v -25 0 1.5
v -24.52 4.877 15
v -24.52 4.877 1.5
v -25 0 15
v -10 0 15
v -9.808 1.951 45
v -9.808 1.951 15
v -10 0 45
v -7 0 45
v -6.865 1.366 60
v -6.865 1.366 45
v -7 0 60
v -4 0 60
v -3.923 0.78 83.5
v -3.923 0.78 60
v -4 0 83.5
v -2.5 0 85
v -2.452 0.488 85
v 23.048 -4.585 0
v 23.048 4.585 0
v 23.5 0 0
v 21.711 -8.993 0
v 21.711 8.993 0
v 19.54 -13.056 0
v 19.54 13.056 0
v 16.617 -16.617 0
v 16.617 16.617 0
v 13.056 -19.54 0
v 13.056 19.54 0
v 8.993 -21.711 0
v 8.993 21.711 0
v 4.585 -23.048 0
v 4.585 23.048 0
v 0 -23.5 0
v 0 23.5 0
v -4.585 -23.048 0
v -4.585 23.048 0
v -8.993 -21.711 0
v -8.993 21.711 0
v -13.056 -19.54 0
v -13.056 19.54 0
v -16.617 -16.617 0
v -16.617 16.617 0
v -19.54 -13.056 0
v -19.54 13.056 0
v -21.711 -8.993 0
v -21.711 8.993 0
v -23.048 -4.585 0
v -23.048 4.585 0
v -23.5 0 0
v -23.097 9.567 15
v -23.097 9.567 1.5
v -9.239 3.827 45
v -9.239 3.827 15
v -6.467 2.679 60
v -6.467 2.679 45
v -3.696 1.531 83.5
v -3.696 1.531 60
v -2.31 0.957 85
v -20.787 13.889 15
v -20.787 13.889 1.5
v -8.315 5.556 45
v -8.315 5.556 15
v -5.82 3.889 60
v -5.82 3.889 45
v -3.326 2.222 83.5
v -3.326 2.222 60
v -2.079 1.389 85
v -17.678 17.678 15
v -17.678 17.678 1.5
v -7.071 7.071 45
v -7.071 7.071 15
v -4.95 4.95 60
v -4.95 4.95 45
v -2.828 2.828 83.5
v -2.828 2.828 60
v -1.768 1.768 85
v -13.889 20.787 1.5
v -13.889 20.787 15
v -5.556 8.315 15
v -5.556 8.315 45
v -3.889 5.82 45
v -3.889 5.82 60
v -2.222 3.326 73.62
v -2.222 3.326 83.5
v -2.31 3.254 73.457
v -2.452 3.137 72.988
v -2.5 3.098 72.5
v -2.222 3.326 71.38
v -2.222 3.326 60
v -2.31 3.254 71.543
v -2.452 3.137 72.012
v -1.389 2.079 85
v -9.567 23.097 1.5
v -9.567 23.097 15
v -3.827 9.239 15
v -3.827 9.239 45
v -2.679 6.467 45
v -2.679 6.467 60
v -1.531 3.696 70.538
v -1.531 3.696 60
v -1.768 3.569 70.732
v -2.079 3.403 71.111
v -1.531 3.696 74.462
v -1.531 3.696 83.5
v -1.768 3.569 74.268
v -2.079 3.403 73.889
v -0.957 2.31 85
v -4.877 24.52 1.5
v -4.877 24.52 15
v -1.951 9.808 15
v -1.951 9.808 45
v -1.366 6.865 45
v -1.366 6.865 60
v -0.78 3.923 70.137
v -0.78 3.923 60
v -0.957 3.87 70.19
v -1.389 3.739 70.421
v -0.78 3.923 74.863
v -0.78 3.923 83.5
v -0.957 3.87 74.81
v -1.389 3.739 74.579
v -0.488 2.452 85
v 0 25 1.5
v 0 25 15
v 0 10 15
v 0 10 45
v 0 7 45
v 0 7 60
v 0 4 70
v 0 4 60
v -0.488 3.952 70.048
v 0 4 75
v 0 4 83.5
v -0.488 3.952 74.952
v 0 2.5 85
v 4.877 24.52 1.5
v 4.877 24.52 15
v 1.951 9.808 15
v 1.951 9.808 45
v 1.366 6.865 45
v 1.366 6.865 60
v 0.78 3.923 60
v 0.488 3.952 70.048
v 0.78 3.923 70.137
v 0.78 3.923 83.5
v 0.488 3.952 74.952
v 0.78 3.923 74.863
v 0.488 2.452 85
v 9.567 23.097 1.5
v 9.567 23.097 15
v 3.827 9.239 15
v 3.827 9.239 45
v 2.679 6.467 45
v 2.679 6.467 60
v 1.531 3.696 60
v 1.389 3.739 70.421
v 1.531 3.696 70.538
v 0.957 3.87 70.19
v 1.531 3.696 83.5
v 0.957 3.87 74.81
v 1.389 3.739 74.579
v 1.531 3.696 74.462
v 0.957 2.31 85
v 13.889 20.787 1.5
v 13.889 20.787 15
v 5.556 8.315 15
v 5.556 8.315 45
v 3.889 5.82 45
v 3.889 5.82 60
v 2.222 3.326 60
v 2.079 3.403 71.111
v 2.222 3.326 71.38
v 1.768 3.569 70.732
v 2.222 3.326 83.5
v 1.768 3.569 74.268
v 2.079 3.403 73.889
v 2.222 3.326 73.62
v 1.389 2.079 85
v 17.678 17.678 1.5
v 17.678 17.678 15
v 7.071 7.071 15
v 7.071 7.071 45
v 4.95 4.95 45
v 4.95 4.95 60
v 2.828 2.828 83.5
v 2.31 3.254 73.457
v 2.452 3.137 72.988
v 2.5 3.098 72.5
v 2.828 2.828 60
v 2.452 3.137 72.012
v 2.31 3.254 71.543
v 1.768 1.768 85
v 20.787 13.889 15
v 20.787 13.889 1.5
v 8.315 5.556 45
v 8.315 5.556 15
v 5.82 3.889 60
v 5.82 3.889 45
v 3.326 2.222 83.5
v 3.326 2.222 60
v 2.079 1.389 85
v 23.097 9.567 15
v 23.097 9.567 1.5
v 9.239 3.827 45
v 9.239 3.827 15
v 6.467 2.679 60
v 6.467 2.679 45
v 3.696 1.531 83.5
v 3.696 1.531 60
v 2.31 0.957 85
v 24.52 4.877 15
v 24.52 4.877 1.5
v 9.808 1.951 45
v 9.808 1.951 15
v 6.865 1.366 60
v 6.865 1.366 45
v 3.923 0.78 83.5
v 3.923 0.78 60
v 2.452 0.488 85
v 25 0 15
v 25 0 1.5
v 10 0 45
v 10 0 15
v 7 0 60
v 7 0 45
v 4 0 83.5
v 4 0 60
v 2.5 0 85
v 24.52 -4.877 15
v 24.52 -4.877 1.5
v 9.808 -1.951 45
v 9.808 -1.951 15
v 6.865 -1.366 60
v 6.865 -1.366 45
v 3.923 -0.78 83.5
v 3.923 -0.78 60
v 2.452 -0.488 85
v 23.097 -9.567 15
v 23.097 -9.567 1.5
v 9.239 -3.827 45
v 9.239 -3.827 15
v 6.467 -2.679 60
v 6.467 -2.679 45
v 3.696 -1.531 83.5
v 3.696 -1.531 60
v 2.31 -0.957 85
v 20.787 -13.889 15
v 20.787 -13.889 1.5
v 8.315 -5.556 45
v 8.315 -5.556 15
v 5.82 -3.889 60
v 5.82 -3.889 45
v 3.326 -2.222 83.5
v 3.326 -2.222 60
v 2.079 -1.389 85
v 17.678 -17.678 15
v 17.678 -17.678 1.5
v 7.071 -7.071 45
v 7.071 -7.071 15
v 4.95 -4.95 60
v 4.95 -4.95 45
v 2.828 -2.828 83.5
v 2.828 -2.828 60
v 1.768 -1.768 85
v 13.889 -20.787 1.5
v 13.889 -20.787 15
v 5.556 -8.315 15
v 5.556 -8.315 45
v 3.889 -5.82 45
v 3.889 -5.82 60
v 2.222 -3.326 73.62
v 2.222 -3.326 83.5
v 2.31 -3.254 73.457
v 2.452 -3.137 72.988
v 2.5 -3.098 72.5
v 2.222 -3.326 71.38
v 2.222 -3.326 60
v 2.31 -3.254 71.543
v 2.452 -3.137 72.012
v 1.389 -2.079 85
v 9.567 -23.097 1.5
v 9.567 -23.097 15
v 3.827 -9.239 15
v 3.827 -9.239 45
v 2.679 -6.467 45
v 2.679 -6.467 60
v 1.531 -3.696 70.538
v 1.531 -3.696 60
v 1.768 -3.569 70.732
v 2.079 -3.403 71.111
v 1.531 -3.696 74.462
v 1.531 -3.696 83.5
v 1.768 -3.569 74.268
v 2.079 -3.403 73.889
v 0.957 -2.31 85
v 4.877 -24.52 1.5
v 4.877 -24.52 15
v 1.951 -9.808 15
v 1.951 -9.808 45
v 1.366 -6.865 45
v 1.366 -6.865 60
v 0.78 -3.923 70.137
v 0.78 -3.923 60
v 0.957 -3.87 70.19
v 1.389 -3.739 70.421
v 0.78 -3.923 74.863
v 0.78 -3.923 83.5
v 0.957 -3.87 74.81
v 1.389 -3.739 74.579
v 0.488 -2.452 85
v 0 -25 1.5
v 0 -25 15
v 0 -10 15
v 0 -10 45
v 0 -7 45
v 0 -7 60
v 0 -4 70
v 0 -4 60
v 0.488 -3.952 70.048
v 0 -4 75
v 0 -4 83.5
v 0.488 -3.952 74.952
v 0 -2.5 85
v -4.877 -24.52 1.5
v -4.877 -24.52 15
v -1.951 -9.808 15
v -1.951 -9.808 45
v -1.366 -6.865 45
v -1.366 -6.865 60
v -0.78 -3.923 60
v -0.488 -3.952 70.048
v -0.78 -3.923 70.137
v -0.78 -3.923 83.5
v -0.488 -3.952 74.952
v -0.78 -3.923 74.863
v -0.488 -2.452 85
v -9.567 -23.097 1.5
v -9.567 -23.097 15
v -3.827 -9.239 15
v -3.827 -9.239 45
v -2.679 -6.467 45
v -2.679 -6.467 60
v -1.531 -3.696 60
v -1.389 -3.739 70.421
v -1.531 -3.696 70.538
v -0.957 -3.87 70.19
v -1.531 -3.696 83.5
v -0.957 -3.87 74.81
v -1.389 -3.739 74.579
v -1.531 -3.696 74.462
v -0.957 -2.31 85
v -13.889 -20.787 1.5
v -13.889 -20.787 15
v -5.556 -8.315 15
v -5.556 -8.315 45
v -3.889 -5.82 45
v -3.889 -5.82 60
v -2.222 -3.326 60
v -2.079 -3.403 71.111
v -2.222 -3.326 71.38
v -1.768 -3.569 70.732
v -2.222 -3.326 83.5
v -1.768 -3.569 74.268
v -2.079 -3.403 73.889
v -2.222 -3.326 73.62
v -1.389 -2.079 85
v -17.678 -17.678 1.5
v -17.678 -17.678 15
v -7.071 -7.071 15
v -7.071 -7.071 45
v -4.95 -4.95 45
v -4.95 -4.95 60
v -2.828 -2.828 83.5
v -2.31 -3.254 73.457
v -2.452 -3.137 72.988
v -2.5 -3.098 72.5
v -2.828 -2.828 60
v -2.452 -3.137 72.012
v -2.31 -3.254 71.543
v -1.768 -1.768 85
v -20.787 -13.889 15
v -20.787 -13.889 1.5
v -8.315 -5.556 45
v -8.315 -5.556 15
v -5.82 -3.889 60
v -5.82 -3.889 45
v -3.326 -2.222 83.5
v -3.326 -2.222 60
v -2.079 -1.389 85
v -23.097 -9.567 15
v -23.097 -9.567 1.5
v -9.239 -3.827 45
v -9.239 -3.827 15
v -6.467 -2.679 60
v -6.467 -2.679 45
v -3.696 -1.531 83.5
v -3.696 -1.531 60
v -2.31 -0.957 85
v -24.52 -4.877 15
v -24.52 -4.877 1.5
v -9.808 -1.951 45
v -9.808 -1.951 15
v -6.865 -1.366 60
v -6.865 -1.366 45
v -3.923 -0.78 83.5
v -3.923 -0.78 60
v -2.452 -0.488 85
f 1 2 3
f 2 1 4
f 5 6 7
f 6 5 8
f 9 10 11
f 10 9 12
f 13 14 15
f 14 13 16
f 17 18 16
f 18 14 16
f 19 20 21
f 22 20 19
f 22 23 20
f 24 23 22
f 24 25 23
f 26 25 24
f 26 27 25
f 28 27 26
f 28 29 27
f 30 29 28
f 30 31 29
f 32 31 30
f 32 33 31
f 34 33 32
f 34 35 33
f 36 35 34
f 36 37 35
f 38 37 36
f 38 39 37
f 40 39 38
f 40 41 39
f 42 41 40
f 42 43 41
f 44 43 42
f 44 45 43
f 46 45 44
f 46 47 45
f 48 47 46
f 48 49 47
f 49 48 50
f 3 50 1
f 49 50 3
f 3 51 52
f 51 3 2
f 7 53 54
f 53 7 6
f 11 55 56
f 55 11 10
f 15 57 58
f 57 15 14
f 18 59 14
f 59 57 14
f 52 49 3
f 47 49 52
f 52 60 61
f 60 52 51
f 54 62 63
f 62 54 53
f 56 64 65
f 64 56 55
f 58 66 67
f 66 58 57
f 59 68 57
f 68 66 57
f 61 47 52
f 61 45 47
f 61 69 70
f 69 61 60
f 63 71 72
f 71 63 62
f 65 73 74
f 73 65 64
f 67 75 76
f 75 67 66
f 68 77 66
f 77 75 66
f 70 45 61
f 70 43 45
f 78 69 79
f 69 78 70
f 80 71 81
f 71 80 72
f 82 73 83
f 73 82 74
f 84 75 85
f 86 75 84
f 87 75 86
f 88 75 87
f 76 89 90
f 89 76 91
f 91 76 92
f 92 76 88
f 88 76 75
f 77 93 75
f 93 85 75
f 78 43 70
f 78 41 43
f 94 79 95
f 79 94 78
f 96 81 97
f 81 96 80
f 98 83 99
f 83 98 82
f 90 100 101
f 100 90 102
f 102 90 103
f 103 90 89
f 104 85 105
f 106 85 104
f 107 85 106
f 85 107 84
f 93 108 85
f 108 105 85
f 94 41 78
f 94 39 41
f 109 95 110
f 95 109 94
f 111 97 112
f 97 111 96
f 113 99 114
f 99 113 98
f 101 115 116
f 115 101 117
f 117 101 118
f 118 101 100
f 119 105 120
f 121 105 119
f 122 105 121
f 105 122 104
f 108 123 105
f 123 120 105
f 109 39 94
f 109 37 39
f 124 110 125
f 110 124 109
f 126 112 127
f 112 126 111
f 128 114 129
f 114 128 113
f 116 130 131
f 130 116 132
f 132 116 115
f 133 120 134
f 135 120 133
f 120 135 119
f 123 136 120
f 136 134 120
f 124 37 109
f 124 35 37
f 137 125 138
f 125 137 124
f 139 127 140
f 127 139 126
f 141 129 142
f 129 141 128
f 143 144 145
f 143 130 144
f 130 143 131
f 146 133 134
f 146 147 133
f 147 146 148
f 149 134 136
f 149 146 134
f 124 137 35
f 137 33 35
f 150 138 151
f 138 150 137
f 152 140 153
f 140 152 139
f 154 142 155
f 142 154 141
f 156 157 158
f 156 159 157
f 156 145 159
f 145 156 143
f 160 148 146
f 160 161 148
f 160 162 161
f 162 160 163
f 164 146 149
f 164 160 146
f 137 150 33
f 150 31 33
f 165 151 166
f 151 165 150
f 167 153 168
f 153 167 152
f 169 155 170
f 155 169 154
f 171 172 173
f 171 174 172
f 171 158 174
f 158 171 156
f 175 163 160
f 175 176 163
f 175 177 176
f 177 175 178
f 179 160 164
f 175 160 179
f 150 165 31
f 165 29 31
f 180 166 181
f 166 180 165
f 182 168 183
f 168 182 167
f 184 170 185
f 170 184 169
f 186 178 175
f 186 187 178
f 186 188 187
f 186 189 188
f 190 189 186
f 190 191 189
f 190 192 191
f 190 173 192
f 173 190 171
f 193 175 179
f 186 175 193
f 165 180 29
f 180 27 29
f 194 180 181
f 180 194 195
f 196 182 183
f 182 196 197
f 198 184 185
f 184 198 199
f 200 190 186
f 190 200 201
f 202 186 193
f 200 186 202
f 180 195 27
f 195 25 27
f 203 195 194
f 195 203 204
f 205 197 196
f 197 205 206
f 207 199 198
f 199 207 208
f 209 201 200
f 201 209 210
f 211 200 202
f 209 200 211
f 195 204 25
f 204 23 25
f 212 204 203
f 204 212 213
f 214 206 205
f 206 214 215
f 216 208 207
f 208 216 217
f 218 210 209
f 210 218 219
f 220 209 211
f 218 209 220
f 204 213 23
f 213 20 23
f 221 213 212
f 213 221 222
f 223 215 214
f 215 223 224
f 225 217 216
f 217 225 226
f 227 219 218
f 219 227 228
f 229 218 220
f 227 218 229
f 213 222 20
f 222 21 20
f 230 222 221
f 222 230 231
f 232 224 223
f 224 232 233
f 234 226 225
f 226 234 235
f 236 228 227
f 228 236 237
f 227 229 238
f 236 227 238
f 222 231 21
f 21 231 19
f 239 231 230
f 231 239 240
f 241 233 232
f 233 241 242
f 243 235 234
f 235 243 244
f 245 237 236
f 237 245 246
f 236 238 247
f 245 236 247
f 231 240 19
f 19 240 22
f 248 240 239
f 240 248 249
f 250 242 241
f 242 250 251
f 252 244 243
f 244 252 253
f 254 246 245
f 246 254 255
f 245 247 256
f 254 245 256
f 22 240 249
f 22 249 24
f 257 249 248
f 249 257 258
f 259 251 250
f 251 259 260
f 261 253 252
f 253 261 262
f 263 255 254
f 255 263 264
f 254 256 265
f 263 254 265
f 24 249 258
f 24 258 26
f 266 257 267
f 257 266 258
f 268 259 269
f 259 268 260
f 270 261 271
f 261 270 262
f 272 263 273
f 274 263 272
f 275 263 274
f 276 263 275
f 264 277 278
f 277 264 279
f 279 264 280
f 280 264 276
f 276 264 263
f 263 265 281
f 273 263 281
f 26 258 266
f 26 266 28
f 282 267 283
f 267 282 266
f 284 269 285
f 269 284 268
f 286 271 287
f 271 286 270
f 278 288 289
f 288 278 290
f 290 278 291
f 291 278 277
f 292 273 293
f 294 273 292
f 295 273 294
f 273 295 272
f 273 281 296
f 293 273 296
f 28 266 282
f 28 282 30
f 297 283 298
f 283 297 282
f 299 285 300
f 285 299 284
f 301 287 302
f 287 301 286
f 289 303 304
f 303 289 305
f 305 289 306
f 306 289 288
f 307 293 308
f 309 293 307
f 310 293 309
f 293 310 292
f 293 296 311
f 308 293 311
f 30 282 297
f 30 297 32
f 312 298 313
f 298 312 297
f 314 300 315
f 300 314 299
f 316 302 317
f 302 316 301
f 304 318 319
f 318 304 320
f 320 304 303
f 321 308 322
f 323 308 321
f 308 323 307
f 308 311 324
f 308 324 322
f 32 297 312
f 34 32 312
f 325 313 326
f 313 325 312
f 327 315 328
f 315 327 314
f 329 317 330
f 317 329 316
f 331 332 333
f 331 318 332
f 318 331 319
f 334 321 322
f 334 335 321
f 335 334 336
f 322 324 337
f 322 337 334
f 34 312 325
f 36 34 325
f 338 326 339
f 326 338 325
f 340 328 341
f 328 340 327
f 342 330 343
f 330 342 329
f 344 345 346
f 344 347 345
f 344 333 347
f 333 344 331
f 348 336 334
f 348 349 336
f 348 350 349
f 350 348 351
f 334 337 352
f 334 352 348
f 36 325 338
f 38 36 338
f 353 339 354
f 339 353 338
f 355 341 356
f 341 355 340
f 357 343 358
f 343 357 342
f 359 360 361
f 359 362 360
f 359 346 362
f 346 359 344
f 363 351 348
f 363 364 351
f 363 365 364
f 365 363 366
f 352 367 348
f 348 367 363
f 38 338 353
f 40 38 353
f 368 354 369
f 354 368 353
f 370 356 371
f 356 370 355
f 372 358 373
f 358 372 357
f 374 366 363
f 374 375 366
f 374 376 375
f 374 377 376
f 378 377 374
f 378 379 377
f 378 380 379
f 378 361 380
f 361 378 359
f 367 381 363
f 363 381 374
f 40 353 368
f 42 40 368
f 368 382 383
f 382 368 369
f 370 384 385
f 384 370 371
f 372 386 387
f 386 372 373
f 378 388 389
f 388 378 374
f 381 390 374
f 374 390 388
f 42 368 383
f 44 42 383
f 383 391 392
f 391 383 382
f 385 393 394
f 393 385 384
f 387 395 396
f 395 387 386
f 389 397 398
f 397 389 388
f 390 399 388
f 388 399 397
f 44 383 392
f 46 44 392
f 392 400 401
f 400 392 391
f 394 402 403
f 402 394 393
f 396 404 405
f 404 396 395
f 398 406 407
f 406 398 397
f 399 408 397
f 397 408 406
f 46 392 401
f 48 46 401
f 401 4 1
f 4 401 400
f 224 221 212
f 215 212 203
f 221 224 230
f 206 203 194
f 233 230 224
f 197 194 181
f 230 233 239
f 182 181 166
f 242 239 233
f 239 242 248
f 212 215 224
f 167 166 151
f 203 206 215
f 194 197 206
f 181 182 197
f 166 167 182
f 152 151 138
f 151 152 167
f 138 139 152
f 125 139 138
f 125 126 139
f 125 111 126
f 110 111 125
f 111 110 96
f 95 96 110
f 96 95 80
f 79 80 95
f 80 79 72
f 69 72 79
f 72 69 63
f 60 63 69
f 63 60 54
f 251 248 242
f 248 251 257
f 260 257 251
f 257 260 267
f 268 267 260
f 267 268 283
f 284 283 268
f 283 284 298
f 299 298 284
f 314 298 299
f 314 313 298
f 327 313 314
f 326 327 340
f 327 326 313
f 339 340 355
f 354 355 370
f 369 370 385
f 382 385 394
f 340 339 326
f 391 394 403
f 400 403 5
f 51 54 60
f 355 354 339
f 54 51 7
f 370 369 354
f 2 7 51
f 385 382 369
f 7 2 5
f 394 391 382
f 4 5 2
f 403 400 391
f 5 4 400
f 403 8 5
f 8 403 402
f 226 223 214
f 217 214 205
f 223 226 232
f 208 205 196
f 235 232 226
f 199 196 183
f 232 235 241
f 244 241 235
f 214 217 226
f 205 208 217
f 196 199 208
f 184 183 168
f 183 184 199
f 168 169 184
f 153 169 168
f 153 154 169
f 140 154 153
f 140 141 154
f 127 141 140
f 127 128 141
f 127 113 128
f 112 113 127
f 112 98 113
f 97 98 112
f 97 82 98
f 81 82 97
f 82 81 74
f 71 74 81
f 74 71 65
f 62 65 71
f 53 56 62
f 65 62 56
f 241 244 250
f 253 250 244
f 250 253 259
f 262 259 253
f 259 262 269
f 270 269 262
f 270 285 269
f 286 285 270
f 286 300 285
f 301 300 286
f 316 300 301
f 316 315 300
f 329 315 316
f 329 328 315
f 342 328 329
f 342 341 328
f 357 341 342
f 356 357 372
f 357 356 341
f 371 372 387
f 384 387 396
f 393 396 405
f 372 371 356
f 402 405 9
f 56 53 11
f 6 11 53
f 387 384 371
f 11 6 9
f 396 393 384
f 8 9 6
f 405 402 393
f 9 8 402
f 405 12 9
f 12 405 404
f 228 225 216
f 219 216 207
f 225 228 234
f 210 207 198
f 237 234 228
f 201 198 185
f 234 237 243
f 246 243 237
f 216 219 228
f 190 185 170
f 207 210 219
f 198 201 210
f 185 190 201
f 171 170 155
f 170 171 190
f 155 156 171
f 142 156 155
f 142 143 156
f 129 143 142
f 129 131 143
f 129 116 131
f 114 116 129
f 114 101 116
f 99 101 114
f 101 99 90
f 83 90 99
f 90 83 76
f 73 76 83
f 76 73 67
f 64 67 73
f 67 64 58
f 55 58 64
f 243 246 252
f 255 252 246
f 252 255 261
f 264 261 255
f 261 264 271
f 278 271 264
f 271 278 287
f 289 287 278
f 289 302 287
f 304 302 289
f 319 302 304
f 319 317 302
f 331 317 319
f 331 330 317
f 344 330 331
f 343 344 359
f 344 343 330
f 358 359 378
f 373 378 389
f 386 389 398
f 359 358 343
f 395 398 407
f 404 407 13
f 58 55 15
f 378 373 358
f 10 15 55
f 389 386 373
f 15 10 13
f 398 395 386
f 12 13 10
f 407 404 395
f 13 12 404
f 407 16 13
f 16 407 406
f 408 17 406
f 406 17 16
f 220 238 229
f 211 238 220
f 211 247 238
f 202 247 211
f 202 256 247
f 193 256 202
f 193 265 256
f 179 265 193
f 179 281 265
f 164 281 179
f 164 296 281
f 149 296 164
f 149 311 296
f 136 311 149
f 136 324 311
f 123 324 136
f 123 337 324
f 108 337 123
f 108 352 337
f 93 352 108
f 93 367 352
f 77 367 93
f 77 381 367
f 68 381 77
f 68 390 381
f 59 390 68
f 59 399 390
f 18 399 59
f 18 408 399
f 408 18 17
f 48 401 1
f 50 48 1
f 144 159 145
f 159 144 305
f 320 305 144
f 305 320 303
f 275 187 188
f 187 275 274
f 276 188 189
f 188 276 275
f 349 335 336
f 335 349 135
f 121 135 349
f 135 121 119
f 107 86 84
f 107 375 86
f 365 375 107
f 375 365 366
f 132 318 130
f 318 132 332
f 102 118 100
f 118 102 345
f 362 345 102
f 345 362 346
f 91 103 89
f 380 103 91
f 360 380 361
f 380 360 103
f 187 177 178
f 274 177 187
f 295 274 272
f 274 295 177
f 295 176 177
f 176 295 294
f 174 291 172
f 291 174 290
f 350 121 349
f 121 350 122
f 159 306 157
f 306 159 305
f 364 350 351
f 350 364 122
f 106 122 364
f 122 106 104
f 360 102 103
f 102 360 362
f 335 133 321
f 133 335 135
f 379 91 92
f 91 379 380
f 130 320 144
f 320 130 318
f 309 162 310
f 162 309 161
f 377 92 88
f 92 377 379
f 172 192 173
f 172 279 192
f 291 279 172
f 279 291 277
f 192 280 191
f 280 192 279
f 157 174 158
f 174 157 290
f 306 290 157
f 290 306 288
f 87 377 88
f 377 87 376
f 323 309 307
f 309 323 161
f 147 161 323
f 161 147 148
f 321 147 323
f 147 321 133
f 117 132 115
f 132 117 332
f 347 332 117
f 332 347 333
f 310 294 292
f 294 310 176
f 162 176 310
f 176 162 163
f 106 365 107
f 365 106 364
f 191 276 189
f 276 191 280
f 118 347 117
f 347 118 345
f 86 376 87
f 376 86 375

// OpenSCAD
$fn = 32;

// ----------------------------------------------------------------------
// Stepped shaft: diameters 50, 20, 14, 8 mm, 85 mm long
// ----------------------------------------------------------------------

// --- parameters (mm) ---
d1 = 50;                  // step 1 diameter
len1 = 15;                // step 1 length
d2 = 20;                  // step 2 diameter
len2 = 30;                // step 2 length
d3 = 14;                  // step 3 diameter
len3 = 15;                // step 3 length
d4 = 8;                   // step 4 diameter
len4 = 25;                // step 4 length
total = 85;               // overall length
chamfer = 1.5;            // end chamfer
cross_d = 5;              // cross pin hole
cross_z = 72.5;           // cross hole position

/* closed turning profile: x is the radius, y is the length */
profile = [[0, 0], [25 - chamfer, 0], [25, chamfer], [25, 15], [10, 15], [10, 45], [7, 45], [7, 60], [4, 60], [4, 83.5], [2.5, 85], [0, 85]];

difference() {
  rotate_extrude() polygon(profile);
  /* cross pin hole through the small step */
  translate([0, 0, cross_z]) rotate([90, 0, 0]) cylinder(h = d4 + 4, d = cross_d, center = true);
}
